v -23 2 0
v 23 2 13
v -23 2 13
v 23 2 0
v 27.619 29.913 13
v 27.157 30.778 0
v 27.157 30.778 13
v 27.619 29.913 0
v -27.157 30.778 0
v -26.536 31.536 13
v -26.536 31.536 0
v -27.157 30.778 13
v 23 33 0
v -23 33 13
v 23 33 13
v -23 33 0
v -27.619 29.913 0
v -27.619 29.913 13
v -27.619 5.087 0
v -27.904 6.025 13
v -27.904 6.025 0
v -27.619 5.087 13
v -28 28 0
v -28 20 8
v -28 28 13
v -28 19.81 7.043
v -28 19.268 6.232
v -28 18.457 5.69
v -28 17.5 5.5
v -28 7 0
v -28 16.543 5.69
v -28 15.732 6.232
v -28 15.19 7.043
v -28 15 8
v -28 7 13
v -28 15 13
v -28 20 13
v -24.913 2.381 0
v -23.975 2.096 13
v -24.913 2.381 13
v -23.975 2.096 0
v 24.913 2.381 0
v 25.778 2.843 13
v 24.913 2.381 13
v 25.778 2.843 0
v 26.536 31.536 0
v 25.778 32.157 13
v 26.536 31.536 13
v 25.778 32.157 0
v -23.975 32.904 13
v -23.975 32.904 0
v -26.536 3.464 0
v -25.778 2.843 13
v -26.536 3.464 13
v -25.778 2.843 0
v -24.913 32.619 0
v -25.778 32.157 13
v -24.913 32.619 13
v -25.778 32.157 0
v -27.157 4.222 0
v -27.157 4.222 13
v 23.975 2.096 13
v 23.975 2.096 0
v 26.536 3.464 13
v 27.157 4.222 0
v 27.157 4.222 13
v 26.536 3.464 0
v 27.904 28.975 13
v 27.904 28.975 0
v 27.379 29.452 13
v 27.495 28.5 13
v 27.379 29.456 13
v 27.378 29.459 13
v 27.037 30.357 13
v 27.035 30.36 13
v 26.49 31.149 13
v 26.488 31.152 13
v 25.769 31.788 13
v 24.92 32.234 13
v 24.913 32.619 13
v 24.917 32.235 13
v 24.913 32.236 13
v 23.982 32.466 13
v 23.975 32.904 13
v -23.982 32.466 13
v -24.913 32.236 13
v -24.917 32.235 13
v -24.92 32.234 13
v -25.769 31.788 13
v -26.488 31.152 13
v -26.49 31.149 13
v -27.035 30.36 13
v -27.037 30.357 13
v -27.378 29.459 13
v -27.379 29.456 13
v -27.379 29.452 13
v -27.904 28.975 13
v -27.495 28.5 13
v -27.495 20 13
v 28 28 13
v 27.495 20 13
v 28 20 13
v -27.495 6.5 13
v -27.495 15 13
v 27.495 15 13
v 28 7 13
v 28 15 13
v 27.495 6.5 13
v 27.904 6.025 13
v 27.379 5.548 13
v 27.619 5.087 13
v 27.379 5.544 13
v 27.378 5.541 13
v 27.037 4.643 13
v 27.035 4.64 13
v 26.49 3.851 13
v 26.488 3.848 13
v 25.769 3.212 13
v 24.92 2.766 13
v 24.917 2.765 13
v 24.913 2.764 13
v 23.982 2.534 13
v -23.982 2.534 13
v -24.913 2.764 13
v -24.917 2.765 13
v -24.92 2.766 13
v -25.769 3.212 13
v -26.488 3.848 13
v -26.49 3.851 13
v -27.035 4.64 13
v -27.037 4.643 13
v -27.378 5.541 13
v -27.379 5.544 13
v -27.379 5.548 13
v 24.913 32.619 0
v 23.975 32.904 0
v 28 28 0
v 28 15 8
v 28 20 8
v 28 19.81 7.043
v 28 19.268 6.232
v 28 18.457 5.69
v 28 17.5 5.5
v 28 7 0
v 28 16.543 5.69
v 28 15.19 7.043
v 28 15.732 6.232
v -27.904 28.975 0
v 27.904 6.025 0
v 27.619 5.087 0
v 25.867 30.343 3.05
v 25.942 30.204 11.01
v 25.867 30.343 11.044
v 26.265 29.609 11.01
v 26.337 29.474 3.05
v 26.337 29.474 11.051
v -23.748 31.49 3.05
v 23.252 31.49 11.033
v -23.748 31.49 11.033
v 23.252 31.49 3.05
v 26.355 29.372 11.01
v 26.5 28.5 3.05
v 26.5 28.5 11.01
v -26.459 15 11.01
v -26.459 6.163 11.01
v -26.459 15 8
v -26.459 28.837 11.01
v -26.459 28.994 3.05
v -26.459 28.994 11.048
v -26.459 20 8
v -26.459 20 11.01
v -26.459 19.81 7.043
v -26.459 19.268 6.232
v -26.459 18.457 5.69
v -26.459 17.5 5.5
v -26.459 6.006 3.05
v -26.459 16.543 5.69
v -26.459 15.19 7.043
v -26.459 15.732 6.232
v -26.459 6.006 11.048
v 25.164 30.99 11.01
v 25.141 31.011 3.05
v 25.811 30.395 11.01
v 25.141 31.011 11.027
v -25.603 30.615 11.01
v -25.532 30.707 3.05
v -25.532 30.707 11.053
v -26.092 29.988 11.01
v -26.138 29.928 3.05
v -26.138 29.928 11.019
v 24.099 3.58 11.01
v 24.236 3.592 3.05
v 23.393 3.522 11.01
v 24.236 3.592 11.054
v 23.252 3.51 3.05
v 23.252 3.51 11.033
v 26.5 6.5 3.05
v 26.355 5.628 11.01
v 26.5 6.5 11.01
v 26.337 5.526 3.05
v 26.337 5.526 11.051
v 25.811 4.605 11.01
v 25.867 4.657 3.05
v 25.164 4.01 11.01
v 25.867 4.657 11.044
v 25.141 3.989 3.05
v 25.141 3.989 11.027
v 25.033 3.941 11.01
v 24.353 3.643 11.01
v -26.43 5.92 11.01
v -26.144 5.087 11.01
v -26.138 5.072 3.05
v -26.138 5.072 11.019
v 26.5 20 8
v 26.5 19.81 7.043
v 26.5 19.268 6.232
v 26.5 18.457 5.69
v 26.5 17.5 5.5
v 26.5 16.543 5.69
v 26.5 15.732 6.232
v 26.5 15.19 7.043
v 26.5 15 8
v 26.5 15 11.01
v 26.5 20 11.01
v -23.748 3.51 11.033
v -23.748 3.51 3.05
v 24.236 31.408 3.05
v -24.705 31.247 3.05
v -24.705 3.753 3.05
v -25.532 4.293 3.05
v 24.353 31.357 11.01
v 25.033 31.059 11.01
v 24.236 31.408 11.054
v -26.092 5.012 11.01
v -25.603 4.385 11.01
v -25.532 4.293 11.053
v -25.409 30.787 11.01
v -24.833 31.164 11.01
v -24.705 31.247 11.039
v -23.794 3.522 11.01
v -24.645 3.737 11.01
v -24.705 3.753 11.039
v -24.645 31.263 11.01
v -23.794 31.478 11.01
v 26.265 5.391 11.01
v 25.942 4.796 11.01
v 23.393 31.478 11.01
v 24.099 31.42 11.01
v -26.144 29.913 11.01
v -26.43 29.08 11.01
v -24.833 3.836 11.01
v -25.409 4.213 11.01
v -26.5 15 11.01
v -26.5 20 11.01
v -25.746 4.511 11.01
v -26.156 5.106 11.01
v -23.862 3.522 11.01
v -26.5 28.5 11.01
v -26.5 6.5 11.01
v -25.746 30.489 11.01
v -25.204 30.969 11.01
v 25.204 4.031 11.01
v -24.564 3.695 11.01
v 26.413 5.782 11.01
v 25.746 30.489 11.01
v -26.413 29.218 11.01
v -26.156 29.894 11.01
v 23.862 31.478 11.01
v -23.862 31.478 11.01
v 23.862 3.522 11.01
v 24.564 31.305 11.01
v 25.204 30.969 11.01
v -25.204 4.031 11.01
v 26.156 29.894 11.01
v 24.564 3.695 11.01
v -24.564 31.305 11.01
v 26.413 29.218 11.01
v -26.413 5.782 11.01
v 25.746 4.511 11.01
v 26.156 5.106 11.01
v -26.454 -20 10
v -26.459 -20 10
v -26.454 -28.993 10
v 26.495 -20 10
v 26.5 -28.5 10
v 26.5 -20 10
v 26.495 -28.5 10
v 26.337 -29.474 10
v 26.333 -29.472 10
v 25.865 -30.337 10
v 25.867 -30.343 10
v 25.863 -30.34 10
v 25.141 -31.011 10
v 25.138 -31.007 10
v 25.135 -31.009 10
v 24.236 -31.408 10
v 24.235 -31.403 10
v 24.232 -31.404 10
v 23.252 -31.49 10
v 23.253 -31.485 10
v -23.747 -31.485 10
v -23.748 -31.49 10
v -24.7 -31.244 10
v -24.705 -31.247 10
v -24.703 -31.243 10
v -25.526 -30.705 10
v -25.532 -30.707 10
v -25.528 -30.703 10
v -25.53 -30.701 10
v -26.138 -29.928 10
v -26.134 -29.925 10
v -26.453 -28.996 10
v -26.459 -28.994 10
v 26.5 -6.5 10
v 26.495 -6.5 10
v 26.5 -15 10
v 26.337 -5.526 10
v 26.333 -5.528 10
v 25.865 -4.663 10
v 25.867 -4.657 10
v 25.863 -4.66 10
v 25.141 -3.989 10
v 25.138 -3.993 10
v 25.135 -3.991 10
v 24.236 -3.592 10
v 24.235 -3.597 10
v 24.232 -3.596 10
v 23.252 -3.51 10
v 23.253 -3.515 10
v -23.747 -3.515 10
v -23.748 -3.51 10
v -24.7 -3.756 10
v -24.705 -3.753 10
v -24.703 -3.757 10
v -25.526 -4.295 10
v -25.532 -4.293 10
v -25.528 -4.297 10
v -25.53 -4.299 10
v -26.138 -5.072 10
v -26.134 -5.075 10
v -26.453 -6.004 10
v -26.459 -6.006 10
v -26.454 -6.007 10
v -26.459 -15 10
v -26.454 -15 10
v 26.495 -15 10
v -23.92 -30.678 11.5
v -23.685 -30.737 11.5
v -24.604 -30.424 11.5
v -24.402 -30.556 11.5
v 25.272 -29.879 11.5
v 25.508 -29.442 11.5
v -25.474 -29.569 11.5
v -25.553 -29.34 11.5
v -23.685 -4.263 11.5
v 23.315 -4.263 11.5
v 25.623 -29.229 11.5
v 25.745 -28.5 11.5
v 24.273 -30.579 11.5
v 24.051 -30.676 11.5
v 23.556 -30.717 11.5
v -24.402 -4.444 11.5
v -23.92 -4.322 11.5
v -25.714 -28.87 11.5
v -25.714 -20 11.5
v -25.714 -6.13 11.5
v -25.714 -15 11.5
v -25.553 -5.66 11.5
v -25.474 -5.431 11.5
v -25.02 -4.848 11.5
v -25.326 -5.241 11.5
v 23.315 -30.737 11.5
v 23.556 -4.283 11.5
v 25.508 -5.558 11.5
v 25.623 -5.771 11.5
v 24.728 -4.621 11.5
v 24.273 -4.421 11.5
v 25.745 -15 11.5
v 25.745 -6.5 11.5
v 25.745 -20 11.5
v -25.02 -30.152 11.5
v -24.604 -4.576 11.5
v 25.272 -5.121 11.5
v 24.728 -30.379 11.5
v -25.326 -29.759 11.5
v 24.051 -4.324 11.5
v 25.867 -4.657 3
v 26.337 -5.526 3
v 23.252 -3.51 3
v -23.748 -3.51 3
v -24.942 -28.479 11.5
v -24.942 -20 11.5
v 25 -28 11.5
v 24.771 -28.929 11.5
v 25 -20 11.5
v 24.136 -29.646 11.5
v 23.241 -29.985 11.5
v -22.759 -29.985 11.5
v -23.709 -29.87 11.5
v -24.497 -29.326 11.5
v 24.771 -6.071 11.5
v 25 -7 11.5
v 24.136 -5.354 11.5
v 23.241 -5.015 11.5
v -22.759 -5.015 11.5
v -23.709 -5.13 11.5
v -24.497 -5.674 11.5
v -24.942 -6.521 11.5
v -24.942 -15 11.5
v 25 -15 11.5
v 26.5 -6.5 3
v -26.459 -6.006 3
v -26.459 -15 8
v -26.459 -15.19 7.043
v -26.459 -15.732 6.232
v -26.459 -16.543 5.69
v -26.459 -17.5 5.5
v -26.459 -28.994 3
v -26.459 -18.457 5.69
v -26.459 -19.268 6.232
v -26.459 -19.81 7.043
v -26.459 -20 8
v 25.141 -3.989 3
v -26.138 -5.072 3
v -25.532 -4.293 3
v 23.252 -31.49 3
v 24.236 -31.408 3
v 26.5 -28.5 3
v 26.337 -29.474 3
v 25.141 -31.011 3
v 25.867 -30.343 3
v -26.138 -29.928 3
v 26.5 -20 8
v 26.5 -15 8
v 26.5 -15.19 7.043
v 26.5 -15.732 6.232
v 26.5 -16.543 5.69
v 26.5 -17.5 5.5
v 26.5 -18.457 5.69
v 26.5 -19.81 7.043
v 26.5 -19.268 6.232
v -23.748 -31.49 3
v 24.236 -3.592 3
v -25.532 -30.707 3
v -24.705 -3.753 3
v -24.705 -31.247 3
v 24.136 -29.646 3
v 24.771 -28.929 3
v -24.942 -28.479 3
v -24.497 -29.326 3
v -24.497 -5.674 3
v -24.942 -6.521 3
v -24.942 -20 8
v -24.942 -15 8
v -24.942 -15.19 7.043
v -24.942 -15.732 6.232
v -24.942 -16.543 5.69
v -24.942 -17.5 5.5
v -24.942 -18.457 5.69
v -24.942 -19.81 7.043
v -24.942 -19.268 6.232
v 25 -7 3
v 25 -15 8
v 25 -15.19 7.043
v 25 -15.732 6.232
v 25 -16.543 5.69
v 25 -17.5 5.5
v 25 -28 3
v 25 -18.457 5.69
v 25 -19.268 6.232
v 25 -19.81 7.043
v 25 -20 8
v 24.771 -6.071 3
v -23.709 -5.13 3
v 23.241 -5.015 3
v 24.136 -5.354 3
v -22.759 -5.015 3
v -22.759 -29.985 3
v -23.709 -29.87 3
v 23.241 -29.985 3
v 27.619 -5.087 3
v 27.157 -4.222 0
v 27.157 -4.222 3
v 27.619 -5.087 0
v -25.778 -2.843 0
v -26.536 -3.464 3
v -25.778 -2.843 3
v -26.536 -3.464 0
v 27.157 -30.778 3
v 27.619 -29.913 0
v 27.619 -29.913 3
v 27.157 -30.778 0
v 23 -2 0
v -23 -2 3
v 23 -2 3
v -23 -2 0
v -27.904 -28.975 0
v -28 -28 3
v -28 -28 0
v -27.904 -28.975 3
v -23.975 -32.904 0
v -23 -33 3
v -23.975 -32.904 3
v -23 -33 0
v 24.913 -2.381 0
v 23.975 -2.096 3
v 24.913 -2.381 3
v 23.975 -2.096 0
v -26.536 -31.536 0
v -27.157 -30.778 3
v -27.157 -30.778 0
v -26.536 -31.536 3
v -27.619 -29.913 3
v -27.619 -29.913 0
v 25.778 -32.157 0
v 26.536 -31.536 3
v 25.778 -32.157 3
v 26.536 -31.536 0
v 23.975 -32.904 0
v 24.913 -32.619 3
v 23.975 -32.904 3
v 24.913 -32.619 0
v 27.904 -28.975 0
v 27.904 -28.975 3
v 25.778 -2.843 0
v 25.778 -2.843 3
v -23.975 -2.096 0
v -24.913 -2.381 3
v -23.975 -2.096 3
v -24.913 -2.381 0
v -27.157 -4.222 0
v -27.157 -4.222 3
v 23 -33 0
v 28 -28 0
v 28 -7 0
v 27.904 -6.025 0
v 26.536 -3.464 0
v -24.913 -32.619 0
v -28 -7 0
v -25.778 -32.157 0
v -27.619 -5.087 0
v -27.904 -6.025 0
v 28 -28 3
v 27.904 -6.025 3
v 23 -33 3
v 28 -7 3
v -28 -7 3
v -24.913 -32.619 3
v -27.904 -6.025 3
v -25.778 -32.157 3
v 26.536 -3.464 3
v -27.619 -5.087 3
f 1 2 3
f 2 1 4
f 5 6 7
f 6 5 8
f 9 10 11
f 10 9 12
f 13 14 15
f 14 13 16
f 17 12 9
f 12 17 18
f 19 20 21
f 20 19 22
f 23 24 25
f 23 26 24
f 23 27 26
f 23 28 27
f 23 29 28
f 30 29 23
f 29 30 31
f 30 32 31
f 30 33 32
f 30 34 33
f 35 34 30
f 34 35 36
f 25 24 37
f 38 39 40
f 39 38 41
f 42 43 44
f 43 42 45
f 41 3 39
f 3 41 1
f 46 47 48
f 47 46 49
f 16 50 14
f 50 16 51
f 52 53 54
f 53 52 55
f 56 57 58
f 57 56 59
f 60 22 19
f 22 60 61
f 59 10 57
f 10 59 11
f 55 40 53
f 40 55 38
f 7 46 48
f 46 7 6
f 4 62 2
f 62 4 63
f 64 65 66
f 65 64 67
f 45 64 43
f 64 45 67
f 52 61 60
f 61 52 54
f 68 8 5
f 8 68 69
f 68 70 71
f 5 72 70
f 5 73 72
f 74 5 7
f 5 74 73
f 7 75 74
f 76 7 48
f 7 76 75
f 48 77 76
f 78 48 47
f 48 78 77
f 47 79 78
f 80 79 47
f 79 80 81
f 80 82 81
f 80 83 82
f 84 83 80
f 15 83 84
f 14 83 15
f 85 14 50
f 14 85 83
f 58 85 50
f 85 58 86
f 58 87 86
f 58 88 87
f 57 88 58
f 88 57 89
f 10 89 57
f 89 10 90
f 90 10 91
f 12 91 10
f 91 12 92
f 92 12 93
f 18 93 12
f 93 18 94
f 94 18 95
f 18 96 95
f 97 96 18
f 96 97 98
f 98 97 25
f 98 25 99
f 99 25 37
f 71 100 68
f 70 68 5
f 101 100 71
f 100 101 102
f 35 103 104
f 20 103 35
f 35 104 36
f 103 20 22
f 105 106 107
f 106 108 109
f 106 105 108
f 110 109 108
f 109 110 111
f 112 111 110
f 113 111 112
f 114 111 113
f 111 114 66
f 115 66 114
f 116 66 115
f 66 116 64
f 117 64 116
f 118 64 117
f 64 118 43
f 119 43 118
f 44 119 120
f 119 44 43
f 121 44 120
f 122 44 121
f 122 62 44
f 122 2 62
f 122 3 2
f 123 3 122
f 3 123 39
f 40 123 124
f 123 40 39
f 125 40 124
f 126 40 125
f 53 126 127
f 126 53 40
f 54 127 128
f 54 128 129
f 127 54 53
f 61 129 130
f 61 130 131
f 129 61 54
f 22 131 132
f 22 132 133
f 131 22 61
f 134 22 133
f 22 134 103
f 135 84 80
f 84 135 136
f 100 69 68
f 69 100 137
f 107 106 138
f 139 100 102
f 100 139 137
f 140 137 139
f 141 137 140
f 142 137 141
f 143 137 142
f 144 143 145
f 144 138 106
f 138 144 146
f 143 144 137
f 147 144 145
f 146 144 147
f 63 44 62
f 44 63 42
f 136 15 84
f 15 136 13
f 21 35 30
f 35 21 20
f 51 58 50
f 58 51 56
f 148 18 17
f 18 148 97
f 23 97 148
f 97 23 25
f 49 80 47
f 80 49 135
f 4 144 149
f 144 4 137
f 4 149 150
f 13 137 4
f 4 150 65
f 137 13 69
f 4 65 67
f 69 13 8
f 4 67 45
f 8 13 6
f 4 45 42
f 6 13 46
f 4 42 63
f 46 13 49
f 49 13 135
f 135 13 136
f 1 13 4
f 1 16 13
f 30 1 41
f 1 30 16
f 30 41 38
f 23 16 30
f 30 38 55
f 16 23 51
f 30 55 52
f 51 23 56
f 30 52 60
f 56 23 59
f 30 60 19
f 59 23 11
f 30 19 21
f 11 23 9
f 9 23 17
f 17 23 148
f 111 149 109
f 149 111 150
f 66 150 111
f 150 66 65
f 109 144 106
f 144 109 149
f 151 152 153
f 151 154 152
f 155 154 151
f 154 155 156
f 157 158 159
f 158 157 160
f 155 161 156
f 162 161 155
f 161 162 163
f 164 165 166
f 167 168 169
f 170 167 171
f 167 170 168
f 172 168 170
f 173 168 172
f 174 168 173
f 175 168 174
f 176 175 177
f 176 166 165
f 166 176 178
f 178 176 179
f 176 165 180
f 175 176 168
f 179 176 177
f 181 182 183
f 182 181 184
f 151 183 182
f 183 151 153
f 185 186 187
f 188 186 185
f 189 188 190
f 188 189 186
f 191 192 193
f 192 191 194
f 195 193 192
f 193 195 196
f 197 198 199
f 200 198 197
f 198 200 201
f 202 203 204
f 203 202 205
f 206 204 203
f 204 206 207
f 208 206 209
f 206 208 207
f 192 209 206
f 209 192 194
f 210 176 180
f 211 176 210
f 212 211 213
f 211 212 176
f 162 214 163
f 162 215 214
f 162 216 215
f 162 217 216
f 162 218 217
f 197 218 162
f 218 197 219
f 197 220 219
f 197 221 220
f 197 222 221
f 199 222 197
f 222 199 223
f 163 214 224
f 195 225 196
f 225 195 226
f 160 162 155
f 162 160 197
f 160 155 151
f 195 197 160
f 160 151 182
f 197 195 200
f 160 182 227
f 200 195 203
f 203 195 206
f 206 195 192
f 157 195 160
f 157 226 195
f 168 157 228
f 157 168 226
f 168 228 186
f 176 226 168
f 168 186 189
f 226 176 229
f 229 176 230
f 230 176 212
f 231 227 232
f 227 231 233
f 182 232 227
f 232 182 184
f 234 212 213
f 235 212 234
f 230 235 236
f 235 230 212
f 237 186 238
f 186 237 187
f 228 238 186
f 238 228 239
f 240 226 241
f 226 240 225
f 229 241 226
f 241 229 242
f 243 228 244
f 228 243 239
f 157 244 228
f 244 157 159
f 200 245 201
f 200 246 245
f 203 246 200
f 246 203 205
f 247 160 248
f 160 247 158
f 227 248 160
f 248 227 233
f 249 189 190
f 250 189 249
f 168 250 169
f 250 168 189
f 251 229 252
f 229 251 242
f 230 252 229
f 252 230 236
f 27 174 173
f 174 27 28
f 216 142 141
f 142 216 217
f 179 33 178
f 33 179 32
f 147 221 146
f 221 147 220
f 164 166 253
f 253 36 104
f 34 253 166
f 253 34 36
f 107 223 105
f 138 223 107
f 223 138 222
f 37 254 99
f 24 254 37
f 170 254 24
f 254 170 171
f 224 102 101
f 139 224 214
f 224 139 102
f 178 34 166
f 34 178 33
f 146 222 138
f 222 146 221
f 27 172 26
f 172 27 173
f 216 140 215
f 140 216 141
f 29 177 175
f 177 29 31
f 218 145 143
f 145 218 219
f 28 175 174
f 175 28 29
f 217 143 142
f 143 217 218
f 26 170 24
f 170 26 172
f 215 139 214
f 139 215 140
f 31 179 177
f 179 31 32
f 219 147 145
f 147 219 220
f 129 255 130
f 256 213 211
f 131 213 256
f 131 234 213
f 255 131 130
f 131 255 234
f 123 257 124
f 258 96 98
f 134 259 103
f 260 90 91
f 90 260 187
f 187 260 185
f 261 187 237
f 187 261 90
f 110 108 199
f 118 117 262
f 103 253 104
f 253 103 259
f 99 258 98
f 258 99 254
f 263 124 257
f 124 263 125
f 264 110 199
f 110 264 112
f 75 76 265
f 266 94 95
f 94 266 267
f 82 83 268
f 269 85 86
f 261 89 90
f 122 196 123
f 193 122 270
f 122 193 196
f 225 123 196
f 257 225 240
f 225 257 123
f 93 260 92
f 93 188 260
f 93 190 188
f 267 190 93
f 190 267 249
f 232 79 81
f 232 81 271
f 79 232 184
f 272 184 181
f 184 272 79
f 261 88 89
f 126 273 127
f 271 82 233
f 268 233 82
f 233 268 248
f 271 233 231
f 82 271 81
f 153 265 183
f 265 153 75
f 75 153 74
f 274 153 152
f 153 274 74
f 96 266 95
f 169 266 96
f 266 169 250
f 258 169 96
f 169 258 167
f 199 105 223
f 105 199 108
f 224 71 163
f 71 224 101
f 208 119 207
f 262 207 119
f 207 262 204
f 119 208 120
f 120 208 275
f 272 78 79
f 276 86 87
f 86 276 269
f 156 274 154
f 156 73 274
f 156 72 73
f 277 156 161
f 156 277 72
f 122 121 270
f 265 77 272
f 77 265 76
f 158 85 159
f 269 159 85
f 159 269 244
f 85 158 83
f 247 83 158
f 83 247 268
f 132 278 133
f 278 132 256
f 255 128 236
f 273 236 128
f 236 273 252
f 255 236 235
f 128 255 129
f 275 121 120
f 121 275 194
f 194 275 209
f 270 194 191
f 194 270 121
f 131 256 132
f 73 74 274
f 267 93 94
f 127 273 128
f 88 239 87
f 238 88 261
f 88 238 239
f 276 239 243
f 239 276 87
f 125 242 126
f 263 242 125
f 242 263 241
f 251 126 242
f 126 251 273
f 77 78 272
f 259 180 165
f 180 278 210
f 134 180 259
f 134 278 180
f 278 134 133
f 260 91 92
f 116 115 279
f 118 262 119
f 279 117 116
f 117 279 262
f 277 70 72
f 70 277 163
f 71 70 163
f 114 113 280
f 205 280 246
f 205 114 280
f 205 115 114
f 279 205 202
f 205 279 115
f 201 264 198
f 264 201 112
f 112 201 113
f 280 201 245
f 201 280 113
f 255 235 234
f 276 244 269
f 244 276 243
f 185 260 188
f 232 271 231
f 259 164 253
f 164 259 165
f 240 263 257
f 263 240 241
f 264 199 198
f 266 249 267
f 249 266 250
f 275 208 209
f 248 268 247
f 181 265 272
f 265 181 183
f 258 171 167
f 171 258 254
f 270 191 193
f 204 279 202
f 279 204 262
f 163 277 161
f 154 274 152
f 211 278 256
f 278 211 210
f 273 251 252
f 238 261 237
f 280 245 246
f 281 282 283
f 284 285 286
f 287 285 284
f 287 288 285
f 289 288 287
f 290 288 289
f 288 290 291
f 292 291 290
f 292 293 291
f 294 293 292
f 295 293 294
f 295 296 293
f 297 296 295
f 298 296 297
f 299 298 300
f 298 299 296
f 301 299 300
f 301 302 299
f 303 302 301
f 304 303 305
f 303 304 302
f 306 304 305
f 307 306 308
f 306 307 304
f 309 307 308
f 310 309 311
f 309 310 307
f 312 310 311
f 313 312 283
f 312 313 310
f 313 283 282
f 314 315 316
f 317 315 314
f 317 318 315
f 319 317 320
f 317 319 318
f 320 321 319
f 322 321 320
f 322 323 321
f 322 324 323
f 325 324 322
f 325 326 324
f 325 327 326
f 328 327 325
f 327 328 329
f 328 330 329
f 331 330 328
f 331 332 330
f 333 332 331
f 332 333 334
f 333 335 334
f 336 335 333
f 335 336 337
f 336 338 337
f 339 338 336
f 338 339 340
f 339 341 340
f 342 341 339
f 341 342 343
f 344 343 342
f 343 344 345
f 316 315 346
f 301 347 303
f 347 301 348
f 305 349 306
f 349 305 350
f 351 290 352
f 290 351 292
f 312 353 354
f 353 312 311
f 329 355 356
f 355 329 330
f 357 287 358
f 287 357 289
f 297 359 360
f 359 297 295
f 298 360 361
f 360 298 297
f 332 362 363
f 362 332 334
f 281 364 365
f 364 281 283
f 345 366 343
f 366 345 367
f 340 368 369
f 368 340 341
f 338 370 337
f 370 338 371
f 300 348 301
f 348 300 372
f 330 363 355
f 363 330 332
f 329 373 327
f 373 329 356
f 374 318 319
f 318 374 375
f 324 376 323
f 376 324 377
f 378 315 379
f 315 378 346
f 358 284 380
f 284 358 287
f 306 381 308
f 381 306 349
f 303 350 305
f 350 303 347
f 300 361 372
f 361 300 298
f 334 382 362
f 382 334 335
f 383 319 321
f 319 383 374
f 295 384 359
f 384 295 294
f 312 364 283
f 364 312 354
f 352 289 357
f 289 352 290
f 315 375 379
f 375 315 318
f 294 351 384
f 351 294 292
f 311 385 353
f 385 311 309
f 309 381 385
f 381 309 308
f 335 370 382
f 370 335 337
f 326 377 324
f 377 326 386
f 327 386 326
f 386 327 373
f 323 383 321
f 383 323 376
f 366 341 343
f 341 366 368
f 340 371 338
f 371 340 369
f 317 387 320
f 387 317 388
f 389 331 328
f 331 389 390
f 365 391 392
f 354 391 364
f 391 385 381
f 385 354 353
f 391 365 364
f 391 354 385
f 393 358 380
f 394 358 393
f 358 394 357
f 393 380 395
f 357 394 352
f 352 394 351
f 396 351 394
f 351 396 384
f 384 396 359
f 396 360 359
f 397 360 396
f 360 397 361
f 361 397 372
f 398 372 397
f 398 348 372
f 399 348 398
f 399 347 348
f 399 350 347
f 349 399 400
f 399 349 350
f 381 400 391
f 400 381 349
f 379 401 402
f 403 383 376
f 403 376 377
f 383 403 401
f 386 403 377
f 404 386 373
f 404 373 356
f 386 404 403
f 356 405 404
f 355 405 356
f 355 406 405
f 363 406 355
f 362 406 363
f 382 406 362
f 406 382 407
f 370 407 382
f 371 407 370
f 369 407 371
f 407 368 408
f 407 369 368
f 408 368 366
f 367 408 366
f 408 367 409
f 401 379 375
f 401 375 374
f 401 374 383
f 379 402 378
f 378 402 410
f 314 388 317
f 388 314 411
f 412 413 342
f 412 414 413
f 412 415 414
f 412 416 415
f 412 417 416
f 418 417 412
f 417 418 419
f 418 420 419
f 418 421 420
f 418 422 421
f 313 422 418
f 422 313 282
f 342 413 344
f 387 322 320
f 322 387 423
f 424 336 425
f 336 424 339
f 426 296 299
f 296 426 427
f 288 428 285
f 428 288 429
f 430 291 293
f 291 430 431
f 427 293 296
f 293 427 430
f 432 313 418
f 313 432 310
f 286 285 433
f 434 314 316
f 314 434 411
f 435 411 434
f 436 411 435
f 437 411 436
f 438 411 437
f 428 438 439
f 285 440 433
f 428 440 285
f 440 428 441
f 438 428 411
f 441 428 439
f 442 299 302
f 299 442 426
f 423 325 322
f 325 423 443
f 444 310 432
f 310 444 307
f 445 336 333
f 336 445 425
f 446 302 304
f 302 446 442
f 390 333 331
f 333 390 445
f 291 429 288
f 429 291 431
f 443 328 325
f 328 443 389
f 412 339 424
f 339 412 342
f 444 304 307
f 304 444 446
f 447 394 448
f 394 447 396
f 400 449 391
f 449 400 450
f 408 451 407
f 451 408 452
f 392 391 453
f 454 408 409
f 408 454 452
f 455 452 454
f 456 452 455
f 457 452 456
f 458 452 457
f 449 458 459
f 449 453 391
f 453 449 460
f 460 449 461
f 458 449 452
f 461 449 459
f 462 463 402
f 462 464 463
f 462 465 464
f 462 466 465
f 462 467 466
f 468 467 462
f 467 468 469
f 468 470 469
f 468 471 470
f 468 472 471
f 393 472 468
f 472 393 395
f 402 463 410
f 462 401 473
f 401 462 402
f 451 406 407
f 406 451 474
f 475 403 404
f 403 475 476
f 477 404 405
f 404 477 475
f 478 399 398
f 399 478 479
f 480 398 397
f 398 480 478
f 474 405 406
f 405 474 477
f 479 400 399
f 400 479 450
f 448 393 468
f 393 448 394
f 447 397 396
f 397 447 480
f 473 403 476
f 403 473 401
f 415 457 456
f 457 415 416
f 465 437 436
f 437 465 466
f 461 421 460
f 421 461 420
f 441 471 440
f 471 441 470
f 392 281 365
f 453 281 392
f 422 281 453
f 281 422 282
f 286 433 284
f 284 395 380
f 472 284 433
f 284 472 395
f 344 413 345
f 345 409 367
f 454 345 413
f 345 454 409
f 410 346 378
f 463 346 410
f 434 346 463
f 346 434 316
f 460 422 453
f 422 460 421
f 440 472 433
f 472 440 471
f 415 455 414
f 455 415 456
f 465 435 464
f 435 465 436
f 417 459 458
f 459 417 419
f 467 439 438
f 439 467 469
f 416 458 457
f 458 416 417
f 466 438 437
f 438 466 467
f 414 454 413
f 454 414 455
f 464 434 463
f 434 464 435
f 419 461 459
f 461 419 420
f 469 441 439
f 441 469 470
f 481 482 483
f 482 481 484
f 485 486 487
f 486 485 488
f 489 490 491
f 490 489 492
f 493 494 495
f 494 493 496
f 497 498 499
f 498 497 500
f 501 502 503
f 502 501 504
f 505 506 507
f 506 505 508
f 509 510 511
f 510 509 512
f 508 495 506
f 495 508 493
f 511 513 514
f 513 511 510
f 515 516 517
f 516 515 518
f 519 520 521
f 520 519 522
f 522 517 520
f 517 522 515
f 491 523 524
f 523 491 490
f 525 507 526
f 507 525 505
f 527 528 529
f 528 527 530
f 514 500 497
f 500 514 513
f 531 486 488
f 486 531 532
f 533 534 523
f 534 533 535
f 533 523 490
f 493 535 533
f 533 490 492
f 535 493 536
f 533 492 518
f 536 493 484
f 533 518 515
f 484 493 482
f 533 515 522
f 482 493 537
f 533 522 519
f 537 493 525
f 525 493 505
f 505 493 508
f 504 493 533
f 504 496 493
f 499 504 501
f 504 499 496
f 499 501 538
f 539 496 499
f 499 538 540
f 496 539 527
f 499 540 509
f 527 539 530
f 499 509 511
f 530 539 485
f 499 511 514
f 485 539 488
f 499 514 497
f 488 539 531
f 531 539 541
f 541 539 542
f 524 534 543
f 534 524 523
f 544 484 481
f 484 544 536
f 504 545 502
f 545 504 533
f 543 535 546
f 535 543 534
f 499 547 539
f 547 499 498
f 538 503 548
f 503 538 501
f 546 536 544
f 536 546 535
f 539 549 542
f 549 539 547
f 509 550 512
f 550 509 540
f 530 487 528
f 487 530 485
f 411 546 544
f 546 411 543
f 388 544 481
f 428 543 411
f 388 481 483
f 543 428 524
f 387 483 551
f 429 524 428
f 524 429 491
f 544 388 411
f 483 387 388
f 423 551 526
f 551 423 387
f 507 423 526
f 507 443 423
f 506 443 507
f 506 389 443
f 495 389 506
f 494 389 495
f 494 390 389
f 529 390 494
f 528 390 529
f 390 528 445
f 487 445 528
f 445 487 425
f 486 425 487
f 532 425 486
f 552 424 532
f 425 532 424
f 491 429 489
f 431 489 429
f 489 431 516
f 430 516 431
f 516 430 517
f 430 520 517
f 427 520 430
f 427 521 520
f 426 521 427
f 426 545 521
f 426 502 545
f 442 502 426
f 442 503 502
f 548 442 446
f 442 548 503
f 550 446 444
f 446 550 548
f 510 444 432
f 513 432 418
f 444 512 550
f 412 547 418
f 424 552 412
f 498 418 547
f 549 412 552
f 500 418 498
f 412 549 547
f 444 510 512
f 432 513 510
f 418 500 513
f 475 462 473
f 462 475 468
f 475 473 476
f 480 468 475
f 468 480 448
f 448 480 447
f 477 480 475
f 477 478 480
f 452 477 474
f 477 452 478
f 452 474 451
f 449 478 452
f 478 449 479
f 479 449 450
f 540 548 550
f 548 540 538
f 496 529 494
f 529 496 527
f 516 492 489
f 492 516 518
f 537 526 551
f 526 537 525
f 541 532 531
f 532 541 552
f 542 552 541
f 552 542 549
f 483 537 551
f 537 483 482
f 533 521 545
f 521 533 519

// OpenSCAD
// Length of cavity to hold connectors.
cavity_length = 50; // [5:100]

// Width of cavity to hold connectors.
cavity_width  = 25; // [5:100]

// Depth of cavity to hold connectors.
cavity_depth  = 10; // [5:100]

// Thickness of the cover's wall.
wall_thickness = 3; // [2:10]

// Diameter of the cable to cover.
cable_diam = 5; // [1:10]


///////////////////////////////////////////////////////////////
// From Belfry OpenSCAD Library: Placement and Duplication

module right(x) translate([+x,0,0]) children();
module left(x)  translate([-x,0,0]) children();
module back(y)  translate([0,+y,0]) children();
module fwd(y)   translate([0,-y,0]) children();
module up(z)    translate([0,0,+z]) children();
module down(z)  translate([0,0,-z]) children();

module xrot(x) rotate([x,0,0]) children();
module yrot(y) rotate([0,y,0]) children();
module zrot(z) rotate([0,0,z]) children();

module xscale(x) scale([x,1,1]) children();
module yscale(y) scale([1,y,1]) children();
module zscale(z) scale([1,1,z]) children();

module xflip() mirror([1,0,0]) children();
module yflip() mirror([0,1,0]) children();
module zflip() mirror([0,0,1]) children();

module xskew(ya=0,za=0) multmatrix([[1,0,0,0], [tan(ya),1,0,0], [tan(za),0,1,0], [0,0,0,1]]) children();
module yskew(xa=0,za=0) multmatrix([[1,tan(xa),0,0], [0,1,0,0], [0,tan(za),1,0], [0,0,0,1]]) children();
module zskew(xa=0,ya=0) multmatrix([[1,0,tan(xa),0], [0,1,tan(ya),0], [0,0,1,0], [0,0,0,1]]) children();

module mirror_copy(v) {children(); mirror(v) children();}
module xflip_copy() {children(); mirror([1,0,0]) children();}
module yflip_copy() {children(); mirror([0,1,0]) children();}
module zflip_copy() {children(); mirror([0,0,1]) children();}

module move_copies(a=[[0,0,0]]) {for (p = a) translate(p) children();}
module xrot_copies(rots=[0]) {for (r = rots) rotate([r, 0, 0]) children();}
module yrot_copies(rots=[0]) {for (r = rots) rotate([0, r, 0]) children();}
module zrot_copies(rots=[0]) {for (r = rots) rotate([0, 0, r]) children();}

module xspread(spacing=1,n=2) {off=spacing*(n-1)/2.0; for (x =[-off:spacing:off]) translate([x, 0, 0]) children();}
module yspread(spacing=1,n=2) {off=spacing*(n-1)/2.0; for (y =[-off:spacing:off]) translate([0, y, 0]) children();}
module zspread(spacing=1,n=2) {off=spacing*(n-1)/2.0; for (z =[-off:spacing:off]) translate([0, 0, z]) children();}
module spread(p1,p2,n=3) {d=(p2-p1)/(n-1); for (i=[0:n-1]) translate(p1+d*i) children();}

module xring(n=2,r=0,rot=true) {d=360.0/n; for (a=[d:d:360]) xrot(a%360) back(r) xrot(rot?0:-a%360) children();}
module yring(n=2,r=0,rot=true) {d=360.0/n; for (a=[d:d:360]) yrot(a%360) right(r) yrot(rot?0:-a%360) children();}
module zring(n=2,r=0,rot=true) {d=360.0/n; for (a=[d:d:360]) zrot(a%360) right(r) zrot(rot?0:-a%360) children();}

module grid_of(xa=[0],ya=[0],za=[0]) {for (x=xa,y=ya,z=za) translate([x,y,z]) children();}


///////////////////////////////////////////////////////////////
// From Belfry OpenSCAD Library: Shapes

module rrect(size=[1,1,1], r=1, center=false)
{
	translate(center?[0,0,0]:size/2) {
		hull() xspread(size[0]-2*r) {
			hull() yspread(size[1]-2*r) {
				cylinder(r=r, h=size[2], center=true);
			}
		}
	}
}

///////////////////////////////////////////////////////////////


$fa = 1*1;
$fs = 1*1;


module cover_top() {
	up((cavity_depth+wall_thickness)/2) {
		difference() {
			rrect(r=5, size=[cavity_length+2*wall_thickness, cavity_width+2*wall_thickness, cavity_depth+wall_thickness], center=true);
			up(wall_thickness/2+0.05) {
				rrect(r=3, size=[cavity_length+wall_thickness, cavity_width+wall_thickness, cavity_depth], center=true);
			}
			hull() {
				up(wall_thickness/2) {
					grid_of(za=[0, cavity_depth]) {
						yrot(90) cylinder(d=cable_diam, h=cavity_length*2, center=true);
					}
				}
			}
			hull() {
				up(cavity_depth/2+wall_thickness/2-0.99) {
					xspread(cavity_length+wall_thickness-6) {
						yspread(cavity_width+wall_thickness-6) {
							cylinder(r1=3, r2=4, h=2, center=true);
						}
					}
				}
			}
		}
	}
}


module cover_bottom() {
	up((cavity_depth+wall_thickness)/2) {
		down(cavity_depth/2) {
			rrect(r=5, size=[cavity_length+2*wall_thickness, cavity_width+2*wall_thickness, wall_thickness], center=true);
		}
		difference() {
			rrect(r=3, size=[cavity_length+wall_thickness, cavity_width+wall_thickness, cavity_depth], center=true);
			rrect(r=2, size=[cavity_length, cavity_width, cavity_depth+0.05], center=true);
			hull() {
				up(wall_thickness/2) {
					grid_of(za=[0, cavity_depth]) {
						yrot(90) cylinder(d=cable_diam, h=cavity_length*2, center=true);
					}
				}
			}
			up(cavity_depth/2+wall_thickness/2-wall_thickness) {
				difference() {
					up(wall_thickness/2)
						rrect(r=5, size=[cavity_length+2*wall_thickness, cavity_width+2*wall_thickness, wall_thickness], center=true);
					hull() {
						xspread(cavity_length+wall_thickness-6) {
							yspread(cavity_width+wall_thickness-6) {
								up(0.99) cylinder(r1=3, r2=2, h=2, center=true);
							}
						}
					}
				}
			}
		}
	}
}


back((cavity_width+2*wall_thickness)/2+2) cover_top();
fwd((cavity_width+2*wall_thickness)/2+2) cover_bottom();


// vim: noexpandtab tabstop=4 shiftwidth=4 softtabstop=4 nowrap
